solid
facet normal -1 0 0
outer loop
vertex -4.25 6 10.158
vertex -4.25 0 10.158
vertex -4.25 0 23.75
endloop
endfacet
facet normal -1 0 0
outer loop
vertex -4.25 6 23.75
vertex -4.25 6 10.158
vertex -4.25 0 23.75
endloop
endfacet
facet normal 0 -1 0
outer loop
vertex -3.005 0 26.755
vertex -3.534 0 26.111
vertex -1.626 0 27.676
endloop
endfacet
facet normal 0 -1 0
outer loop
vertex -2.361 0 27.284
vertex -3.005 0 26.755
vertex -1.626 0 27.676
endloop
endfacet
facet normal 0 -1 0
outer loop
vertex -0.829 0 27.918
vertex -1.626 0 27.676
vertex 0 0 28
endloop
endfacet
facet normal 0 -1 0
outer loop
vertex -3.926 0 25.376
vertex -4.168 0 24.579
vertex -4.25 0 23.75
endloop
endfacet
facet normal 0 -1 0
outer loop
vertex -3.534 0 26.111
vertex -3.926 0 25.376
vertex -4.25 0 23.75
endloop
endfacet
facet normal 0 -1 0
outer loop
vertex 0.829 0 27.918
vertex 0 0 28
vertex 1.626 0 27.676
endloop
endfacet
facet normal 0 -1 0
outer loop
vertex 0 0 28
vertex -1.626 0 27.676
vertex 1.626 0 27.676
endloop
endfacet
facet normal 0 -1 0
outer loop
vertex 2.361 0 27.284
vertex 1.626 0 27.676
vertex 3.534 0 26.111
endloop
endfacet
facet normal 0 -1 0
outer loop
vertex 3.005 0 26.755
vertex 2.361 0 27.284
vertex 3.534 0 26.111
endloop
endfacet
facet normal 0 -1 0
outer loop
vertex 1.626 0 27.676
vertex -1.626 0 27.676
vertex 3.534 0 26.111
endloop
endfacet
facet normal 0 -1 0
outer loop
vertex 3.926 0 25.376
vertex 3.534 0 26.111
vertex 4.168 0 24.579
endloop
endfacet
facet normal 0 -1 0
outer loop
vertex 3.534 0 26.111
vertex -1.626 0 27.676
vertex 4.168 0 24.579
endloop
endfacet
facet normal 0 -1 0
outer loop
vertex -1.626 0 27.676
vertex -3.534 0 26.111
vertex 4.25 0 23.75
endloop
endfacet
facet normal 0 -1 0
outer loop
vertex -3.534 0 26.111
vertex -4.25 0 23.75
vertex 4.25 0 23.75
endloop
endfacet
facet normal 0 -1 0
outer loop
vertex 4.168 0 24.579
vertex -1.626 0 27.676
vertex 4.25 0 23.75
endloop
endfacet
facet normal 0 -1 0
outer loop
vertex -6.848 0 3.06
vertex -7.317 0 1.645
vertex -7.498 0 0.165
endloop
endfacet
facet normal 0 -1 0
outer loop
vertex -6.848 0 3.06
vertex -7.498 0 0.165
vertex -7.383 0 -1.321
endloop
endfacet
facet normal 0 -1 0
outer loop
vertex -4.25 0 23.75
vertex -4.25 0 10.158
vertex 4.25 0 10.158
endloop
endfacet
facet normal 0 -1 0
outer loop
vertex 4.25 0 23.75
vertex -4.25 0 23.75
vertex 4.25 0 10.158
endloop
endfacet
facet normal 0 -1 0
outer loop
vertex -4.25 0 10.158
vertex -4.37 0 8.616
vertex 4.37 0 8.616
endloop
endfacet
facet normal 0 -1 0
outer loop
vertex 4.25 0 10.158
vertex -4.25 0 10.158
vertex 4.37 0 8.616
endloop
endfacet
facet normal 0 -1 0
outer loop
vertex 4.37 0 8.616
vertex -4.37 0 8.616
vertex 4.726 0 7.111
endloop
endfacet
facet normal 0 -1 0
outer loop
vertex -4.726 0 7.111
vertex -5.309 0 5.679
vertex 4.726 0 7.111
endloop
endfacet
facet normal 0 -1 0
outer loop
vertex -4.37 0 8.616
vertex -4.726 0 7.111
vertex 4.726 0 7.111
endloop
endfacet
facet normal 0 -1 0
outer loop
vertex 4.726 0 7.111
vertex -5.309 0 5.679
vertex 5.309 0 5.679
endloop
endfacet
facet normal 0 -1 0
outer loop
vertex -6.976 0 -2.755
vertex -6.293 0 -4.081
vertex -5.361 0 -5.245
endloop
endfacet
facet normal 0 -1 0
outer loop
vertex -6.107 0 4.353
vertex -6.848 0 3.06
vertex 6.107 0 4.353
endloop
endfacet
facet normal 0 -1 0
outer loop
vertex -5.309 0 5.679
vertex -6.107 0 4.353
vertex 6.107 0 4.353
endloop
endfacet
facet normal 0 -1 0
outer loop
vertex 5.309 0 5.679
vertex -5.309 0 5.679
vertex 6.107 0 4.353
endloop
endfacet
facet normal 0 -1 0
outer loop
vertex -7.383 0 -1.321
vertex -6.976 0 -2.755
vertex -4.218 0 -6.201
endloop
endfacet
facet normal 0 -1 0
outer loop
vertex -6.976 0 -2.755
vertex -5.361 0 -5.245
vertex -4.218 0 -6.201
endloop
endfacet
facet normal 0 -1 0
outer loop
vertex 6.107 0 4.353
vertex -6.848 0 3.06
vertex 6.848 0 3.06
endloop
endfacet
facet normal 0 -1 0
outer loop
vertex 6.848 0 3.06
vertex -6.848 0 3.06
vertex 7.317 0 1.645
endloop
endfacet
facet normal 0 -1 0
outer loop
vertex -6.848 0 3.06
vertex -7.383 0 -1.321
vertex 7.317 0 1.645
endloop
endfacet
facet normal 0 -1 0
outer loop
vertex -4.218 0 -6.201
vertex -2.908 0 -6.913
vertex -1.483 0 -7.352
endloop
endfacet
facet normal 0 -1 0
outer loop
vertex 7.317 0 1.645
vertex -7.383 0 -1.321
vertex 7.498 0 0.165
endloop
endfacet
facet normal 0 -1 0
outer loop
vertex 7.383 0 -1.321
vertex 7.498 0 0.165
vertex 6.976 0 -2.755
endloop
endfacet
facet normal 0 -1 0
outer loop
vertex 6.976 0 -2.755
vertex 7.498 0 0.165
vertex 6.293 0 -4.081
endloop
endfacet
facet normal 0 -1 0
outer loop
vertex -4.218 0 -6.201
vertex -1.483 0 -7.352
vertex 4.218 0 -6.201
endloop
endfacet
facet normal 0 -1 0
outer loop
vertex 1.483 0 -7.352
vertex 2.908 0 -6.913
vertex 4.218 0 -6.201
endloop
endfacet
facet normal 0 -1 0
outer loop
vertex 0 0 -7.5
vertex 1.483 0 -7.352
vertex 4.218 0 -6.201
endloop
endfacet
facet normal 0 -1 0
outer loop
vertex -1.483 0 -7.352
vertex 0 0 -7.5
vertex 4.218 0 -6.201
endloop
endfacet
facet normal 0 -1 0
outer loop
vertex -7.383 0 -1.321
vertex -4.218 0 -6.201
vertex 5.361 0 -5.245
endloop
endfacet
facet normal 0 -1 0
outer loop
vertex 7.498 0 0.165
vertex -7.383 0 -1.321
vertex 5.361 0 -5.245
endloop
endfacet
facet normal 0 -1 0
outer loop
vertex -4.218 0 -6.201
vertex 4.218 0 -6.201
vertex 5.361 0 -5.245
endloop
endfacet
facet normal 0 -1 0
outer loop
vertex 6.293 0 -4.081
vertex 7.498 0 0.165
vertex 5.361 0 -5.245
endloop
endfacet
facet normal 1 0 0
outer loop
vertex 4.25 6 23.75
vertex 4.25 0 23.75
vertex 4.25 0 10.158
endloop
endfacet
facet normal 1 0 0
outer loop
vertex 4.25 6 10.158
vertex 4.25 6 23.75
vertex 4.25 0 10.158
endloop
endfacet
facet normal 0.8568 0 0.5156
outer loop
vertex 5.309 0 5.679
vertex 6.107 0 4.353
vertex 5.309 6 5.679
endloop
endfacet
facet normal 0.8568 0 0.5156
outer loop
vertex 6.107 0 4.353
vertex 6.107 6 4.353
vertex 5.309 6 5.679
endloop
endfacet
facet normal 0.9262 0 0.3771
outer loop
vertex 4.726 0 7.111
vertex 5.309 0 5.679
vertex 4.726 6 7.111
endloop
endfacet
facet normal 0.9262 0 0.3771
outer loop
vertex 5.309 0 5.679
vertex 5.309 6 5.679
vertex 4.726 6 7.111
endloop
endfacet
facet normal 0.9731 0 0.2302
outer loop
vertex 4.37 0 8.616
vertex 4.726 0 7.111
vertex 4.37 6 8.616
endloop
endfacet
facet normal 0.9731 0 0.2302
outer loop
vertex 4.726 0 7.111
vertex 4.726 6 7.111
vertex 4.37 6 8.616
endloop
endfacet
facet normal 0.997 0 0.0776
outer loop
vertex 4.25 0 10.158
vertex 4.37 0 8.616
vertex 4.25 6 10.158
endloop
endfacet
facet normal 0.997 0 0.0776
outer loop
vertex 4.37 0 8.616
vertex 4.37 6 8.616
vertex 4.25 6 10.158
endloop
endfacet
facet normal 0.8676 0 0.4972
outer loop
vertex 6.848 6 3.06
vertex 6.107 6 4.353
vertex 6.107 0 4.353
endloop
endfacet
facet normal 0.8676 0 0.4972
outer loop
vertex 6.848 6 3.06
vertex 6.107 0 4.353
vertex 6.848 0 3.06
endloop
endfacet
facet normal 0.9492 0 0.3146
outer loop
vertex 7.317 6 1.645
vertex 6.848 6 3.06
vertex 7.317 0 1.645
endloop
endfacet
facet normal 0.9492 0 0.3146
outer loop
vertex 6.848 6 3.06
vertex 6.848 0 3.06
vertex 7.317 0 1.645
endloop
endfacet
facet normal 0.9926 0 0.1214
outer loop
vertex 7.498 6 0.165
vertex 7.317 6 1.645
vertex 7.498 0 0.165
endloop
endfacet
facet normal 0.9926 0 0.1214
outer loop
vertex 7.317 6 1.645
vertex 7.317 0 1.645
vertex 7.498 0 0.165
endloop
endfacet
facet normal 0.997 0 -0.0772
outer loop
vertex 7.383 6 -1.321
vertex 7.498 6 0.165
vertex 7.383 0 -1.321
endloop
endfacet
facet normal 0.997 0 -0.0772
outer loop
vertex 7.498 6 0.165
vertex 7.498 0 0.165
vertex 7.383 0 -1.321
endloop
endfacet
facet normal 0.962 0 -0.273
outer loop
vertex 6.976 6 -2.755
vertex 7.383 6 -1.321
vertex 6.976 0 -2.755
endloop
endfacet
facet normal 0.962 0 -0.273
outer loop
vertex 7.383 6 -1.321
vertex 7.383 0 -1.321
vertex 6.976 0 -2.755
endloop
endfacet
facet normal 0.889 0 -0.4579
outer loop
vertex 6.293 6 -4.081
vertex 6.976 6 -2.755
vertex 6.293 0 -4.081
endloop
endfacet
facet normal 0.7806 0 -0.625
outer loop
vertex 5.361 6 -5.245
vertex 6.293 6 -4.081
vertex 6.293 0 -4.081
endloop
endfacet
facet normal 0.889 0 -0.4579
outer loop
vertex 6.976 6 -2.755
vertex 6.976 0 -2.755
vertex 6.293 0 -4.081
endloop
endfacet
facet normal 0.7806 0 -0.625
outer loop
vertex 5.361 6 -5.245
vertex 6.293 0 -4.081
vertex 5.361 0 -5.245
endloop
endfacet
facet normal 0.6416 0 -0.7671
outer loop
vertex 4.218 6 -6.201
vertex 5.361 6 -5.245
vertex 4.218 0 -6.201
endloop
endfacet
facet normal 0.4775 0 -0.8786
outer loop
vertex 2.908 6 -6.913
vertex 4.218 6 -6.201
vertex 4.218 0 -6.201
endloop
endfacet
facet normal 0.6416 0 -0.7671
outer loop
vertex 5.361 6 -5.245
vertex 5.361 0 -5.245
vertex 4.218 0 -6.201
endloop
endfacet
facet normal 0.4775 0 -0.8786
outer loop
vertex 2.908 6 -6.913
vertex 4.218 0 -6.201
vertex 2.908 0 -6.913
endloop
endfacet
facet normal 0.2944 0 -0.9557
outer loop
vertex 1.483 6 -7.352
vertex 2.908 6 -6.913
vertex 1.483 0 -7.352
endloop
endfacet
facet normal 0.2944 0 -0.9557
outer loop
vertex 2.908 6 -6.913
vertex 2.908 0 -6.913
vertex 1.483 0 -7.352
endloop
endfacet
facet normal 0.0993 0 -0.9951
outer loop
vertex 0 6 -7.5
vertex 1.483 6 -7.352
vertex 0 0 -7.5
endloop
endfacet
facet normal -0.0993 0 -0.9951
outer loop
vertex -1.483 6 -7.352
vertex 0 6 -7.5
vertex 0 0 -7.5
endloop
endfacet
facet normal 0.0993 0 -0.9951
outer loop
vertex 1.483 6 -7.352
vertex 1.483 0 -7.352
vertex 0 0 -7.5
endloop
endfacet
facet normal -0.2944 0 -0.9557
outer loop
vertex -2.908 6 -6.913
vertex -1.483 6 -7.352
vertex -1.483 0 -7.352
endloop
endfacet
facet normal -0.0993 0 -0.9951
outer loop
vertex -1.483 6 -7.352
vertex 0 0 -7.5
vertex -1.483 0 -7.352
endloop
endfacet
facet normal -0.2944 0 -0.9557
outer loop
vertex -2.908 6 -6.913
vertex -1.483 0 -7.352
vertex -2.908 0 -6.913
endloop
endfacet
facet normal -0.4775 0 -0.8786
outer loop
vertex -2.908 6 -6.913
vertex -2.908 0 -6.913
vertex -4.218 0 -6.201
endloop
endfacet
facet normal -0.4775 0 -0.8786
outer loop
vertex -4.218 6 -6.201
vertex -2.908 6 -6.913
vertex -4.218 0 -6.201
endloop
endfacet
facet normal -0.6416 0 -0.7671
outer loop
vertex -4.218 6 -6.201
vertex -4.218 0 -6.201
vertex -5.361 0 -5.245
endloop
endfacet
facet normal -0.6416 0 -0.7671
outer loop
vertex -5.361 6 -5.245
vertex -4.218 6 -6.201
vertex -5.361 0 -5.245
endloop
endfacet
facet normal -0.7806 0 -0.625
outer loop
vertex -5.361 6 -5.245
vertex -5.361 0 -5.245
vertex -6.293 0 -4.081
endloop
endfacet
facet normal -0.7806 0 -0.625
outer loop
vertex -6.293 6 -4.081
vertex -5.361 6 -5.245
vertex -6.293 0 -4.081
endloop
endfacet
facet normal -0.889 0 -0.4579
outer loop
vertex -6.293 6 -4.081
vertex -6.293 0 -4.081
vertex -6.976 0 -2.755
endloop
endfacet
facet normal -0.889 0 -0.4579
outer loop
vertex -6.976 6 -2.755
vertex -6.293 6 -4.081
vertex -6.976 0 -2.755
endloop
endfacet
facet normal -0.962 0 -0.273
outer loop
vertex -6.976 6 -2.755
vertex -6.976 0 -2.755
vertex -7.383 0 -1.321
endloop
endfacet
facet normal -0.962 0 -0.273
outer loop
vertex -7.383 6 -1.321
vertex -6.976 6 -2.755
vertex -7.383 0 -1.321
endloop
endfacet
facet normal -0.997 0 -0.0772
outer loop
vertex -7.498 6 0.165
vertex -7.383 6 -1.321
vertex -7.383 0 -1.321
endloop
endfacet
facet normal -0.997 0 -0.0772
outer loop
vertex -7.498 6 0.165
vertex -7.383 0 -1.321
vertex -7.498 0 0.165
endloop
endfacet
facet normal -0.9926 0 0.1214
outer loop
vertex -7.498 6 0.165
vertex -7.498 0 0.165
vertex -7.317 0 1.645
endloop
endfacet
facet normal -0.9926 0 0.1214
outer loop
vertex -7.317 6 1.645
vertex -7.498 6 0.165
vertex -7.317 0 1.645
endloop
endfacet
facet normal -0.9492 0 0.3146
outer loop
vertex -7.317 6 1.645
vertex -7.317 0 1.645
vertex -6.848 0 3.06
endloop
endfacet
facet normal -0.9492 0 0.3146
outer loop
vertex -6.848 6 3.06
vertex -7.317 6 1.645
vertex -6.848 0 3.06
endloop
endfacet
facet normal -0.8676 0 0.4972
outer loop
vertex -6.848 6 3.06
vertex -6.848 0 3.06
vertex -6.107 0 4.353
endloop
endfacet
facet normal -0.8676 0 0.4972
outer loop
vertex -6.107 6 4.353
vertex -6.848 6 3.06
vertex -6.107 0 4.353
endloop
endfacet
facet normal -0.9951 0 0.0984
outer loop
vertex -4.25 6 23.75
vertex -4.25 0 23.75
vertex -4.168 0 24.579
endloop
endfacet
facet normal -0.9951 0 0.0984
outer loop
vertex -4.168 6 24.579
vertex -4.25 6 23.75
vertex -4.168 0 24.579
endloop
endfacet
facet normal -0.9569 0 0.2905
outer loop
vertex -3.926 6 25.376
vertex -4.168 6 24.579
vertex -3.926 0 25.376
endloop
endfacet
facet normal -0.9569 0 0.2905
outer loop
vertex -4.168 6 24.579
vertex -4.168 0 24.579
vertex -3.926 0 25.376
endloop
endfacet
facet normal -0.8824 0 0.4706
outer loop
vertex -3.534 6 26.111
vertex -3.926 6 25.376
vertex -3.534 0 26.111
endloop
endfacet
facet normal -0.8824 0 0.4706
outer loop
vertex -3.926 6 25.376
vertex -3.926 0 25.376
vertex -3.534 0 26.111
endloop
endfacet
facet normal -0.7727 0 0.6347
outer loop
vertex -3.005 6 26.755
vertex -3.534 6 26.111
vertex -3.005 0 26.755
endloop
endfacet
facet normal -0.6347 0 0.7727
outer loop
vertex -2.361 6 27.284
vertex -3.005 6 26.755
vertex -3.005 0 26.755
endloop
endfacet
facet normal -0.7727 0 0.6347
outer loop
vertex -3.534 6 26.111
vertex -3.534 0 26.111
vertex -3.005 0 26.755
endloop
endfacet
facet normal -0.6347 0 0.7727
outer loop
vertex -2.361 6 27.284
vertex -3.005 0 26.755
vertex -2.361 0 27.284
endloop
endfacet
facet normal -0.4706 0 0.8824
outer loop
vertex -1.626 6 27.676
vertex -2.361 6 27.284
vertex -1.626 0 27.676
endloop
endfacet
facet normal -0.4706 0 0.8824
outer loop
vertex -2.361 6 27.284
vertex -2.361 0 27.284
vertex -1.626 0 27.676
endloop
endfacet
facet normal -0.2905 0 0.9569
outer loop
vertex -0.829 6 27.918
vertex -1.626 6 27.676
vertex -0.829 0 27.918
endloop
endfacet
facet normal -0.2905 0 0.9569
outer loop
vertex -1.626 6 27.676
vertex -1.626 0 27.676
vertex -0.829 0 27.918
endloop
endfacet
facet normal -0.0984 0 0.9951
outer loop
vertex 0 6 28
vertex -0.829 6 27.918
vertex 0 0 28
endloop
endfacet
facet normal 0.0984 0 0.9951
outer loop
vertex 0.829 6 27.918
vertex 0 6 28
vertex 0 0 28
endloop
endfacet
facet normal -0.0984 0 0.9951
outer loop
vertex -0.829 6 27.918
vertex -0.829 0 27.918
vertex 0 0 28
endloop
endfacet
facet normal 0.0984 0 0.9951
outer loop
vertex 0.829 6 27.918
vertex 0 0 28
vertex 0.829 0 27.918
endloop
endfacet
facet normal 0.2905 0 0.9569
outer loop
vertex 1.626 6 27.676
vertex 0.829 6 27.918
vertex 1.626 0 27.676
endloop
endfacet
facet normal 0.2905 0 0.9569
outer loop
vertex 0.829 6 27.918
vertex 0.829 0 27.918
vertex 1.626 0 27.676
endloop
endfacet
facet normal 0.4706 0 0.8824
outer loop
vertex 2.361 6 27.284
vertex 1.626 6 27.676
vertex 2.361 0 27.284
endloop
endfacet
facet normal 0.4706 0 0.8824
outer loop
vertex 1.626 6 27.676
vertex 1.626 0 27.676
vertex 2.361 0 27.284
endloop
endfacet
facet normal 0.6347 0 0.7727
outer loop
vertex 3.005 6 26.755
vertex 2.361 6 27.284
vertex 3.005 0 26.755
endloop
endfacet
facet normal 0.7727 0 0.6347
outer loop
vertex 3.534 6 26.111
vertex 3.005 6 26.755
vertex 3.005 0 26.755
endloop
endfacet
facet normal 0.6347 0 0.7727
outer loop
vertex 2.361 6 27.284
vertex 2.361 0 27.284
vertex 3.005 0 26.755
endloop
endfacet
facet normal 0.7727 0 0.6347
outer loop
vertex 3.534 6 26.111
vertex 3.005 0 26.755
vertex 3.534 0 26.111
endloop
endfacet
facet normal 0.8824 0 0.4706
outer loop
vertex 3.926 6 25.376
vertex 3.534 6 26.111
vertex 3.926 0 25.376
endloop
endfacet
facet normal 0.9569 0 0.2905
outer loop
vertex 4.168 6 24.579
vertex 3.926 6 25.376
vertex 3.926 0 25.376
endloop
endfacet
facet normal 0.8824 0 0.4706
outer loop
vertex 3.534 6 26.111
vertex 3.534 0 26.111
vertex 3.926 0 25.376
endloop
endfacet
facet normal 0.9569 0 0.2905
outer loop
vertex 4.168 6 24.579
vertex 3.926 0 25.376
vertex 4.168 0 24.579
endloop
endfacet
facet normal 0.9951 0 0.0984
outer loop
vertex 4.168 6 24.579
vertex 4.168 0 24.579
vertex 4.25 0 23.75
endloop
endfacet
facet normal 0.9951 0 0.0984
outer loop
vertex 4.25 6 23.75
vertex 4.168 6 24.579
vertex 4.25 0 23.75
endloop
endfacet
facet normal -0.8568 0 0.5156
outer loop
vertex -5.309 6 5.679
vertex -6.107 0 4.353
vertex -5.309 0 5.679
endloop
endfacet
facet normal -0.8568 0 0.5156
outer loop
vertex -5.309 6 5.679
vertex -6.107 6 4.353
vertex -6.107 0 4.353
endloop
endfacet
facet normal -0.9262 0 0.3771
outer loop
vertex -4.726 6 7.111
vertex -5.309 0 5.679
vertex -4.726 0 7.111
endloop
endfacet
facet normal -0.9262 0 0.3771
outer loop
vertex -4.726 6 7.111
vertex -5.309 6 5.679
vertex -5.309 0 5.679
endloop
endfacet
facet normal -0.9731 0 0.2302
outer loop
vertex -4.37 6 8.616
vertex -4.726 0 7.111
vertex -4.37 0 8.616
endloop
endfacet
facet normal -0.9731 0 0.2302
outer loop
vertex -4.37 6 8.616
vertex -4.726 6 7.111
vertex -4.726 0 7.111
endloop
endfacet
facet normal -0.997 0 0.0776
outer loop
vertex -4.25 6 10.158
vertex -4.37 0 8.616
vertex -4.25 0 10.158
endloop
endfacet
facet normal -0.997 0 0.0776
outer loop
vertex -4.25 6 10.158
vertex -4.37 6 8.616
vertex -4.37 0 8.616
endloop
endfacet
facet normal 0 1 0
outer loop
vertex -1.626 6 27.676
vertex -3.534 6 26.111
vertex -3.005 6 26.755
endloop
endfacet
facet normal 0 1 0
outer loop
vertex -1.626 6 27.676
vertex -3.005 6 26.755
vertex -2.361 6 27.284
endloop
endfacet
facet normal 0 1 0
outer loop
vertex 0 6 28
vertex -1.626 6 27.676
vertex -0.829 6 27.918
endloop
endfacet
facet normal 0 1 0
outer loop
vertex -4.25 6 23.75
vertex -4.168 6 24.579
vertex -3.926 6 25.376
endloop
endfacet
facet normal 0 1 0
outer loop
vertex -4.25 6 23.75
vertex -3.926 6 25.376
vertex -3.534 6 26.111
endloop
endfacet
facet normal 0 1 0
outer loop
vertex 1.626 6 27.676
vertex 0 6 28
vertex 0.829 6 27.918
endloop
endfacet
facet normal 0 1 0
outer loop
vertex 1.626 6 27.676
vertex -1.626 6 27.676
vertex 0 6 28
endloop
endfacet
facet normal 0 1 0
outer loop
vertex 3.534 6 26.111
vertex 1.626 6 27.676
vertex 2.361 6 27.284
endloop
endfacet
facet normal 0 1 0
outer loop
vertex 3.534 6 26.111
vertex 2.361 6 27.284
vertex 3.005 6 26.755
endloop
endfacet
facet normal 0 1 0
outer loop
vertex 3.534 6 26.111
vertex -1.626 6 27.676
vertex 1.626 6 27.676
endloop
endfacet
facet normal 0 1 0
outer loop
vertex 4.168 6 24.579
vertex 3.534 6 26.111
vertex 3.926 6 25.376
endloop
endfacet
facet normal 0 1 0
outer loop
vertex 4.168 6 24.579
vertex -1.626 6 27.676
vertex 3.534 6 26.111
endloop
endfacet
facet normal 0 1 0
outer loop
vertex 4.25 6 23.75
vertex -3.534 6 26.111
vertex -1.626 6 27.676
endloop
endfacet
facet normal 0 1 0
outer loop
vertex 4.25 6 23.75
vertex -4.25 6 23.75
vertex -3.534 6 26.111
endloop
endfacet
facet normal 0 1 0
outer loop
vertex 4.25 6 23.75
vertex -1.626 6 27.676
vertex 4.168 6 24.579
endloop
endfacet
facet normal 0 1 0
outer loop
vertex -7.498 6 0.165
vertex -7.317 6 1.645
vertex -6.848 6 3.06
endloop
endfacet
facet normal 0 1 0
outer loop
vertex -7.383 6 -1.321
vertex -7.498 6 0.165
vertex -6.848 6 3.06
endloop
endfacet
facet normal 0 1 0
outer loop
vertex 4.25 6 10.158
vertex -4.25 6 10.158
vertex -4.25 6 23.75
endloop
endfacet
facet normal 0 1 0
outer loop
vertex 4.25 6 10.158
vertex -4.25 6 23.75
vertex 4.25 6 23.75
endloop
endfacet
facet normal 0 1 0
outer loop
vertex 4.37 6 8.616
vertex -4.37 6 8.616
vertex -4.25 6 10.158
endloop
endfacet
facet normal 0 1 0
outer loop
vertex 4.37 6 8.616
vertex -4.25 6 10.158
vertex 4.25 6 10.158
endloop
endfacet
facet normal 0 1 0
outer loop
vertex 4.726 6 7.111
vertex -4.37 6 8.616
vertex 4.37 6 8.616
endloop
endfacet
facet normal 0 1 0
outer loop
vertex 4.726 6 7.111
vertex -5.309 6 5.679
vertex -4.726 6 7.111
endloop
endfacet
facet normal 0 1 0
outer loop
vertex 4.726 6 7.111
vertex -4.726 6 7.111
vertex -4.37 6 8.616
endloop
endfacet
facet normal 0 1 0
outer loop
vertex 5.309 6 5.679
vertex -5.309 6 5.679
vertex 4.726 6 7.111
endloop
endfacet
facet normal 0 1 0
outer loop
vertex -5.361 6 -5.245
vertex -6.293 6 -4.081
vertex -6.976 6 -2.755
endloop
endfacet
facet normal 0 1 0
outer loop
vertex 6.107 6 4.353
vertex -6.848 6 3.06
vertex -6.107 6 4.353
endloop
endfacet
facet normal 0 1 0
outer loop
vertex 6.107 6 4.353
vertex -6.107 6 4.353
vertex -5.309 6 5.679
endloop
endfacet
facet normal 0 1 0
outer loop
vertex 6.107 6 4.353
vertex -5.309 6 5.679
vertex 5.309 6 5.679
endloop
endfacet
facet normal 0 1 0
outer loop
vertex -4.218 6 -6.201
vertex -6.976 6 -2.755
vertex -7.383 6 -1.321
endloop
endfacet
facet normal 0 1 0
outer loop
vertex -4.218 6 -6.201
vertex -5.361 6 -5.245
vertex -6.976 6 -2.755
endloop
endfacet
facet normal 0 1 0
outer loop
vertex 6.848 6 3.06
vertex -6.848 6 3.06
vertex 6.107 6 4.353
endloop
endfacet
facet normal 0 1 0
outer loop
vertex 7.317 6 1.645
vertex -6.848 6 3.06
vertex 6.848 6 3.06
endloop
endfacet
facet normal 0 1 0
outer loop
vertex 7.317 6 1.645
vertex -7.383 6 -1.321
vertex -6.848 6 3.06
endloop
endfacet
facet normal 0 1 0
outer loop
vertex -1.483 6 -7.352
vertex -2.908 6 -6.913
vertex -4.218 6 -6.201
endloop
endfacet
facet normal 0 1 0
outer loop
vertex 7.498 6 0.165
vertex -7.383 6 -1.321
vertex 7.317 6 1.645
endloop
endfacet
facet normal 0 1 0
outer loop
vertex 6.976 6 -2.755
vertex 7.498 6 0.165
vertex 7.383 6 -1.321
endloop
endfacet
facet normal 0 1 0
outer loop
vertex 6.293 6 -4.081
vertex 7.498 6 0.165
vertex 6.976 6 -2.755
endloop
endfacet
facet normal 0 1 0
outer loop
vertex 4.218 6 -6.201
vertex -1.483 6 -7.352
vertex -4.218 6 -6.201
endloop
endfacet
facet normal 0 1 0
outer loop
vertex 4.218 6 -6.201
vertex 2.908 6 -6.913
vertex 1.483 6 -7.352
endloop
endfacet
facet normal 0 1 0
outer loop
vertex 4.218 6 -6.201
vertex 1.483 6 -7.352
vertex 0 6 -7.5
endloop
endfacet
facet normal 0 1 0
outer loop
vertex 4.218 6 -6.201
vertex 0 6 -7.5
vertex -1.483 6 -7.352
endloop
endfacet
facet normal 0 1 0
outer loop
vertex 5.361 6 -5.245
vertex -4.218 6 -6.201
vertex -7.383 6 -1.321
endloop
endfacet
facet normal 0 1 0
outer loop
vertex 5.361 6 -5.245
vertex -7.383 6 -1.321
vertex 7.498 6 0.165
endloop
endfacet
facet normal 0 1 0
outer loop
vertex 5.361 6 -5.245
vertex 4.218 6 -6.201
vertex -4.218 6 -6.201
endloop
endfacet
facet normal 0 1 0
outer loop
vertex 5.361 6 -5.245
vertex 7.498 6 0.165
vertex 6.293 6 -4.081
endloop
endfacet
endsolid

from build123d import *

# Parameters (mm, degrees)
SKETCH1_R           = 7.5
BOSS_EXTRUDE1_DEPTH = 6
FILLET1_R           = 10


with BuildPart() as part:
    # Sketch1 → Boss-Extrude1 (new body)
    with BuildSketch(Plane(origin=(0, 0, 0), x_dir=(1, 0, 0), z_dir=(0, 1, 0))):
        Circle(SKETCH1_R)
        with BuildLine():
            Line((-4.25, 0), (-4.25, -23.75))
            ThreePointArc((-4.25, -23.75), (0, -28), (4.25, -23.75))
            Line((4.25, -23.75), (4.25, 0))
            ThreePointArc((4.25, 0), (0, 4.25), (-4.25, 0))
        make_face()
    extrude(amount=BOSS_EXTRUDE1_DEPTH)

    # Fillet1
    fillet1_edges = [part.edges().sort_by_distance(p)[0] for p in [
        (4.25, 3, 6.179603547),
        (-4.25, 3, 6.179603547),
    ]]
    fillet(fillet1_edges, radius=FILLET1_R)


solid = part.part
